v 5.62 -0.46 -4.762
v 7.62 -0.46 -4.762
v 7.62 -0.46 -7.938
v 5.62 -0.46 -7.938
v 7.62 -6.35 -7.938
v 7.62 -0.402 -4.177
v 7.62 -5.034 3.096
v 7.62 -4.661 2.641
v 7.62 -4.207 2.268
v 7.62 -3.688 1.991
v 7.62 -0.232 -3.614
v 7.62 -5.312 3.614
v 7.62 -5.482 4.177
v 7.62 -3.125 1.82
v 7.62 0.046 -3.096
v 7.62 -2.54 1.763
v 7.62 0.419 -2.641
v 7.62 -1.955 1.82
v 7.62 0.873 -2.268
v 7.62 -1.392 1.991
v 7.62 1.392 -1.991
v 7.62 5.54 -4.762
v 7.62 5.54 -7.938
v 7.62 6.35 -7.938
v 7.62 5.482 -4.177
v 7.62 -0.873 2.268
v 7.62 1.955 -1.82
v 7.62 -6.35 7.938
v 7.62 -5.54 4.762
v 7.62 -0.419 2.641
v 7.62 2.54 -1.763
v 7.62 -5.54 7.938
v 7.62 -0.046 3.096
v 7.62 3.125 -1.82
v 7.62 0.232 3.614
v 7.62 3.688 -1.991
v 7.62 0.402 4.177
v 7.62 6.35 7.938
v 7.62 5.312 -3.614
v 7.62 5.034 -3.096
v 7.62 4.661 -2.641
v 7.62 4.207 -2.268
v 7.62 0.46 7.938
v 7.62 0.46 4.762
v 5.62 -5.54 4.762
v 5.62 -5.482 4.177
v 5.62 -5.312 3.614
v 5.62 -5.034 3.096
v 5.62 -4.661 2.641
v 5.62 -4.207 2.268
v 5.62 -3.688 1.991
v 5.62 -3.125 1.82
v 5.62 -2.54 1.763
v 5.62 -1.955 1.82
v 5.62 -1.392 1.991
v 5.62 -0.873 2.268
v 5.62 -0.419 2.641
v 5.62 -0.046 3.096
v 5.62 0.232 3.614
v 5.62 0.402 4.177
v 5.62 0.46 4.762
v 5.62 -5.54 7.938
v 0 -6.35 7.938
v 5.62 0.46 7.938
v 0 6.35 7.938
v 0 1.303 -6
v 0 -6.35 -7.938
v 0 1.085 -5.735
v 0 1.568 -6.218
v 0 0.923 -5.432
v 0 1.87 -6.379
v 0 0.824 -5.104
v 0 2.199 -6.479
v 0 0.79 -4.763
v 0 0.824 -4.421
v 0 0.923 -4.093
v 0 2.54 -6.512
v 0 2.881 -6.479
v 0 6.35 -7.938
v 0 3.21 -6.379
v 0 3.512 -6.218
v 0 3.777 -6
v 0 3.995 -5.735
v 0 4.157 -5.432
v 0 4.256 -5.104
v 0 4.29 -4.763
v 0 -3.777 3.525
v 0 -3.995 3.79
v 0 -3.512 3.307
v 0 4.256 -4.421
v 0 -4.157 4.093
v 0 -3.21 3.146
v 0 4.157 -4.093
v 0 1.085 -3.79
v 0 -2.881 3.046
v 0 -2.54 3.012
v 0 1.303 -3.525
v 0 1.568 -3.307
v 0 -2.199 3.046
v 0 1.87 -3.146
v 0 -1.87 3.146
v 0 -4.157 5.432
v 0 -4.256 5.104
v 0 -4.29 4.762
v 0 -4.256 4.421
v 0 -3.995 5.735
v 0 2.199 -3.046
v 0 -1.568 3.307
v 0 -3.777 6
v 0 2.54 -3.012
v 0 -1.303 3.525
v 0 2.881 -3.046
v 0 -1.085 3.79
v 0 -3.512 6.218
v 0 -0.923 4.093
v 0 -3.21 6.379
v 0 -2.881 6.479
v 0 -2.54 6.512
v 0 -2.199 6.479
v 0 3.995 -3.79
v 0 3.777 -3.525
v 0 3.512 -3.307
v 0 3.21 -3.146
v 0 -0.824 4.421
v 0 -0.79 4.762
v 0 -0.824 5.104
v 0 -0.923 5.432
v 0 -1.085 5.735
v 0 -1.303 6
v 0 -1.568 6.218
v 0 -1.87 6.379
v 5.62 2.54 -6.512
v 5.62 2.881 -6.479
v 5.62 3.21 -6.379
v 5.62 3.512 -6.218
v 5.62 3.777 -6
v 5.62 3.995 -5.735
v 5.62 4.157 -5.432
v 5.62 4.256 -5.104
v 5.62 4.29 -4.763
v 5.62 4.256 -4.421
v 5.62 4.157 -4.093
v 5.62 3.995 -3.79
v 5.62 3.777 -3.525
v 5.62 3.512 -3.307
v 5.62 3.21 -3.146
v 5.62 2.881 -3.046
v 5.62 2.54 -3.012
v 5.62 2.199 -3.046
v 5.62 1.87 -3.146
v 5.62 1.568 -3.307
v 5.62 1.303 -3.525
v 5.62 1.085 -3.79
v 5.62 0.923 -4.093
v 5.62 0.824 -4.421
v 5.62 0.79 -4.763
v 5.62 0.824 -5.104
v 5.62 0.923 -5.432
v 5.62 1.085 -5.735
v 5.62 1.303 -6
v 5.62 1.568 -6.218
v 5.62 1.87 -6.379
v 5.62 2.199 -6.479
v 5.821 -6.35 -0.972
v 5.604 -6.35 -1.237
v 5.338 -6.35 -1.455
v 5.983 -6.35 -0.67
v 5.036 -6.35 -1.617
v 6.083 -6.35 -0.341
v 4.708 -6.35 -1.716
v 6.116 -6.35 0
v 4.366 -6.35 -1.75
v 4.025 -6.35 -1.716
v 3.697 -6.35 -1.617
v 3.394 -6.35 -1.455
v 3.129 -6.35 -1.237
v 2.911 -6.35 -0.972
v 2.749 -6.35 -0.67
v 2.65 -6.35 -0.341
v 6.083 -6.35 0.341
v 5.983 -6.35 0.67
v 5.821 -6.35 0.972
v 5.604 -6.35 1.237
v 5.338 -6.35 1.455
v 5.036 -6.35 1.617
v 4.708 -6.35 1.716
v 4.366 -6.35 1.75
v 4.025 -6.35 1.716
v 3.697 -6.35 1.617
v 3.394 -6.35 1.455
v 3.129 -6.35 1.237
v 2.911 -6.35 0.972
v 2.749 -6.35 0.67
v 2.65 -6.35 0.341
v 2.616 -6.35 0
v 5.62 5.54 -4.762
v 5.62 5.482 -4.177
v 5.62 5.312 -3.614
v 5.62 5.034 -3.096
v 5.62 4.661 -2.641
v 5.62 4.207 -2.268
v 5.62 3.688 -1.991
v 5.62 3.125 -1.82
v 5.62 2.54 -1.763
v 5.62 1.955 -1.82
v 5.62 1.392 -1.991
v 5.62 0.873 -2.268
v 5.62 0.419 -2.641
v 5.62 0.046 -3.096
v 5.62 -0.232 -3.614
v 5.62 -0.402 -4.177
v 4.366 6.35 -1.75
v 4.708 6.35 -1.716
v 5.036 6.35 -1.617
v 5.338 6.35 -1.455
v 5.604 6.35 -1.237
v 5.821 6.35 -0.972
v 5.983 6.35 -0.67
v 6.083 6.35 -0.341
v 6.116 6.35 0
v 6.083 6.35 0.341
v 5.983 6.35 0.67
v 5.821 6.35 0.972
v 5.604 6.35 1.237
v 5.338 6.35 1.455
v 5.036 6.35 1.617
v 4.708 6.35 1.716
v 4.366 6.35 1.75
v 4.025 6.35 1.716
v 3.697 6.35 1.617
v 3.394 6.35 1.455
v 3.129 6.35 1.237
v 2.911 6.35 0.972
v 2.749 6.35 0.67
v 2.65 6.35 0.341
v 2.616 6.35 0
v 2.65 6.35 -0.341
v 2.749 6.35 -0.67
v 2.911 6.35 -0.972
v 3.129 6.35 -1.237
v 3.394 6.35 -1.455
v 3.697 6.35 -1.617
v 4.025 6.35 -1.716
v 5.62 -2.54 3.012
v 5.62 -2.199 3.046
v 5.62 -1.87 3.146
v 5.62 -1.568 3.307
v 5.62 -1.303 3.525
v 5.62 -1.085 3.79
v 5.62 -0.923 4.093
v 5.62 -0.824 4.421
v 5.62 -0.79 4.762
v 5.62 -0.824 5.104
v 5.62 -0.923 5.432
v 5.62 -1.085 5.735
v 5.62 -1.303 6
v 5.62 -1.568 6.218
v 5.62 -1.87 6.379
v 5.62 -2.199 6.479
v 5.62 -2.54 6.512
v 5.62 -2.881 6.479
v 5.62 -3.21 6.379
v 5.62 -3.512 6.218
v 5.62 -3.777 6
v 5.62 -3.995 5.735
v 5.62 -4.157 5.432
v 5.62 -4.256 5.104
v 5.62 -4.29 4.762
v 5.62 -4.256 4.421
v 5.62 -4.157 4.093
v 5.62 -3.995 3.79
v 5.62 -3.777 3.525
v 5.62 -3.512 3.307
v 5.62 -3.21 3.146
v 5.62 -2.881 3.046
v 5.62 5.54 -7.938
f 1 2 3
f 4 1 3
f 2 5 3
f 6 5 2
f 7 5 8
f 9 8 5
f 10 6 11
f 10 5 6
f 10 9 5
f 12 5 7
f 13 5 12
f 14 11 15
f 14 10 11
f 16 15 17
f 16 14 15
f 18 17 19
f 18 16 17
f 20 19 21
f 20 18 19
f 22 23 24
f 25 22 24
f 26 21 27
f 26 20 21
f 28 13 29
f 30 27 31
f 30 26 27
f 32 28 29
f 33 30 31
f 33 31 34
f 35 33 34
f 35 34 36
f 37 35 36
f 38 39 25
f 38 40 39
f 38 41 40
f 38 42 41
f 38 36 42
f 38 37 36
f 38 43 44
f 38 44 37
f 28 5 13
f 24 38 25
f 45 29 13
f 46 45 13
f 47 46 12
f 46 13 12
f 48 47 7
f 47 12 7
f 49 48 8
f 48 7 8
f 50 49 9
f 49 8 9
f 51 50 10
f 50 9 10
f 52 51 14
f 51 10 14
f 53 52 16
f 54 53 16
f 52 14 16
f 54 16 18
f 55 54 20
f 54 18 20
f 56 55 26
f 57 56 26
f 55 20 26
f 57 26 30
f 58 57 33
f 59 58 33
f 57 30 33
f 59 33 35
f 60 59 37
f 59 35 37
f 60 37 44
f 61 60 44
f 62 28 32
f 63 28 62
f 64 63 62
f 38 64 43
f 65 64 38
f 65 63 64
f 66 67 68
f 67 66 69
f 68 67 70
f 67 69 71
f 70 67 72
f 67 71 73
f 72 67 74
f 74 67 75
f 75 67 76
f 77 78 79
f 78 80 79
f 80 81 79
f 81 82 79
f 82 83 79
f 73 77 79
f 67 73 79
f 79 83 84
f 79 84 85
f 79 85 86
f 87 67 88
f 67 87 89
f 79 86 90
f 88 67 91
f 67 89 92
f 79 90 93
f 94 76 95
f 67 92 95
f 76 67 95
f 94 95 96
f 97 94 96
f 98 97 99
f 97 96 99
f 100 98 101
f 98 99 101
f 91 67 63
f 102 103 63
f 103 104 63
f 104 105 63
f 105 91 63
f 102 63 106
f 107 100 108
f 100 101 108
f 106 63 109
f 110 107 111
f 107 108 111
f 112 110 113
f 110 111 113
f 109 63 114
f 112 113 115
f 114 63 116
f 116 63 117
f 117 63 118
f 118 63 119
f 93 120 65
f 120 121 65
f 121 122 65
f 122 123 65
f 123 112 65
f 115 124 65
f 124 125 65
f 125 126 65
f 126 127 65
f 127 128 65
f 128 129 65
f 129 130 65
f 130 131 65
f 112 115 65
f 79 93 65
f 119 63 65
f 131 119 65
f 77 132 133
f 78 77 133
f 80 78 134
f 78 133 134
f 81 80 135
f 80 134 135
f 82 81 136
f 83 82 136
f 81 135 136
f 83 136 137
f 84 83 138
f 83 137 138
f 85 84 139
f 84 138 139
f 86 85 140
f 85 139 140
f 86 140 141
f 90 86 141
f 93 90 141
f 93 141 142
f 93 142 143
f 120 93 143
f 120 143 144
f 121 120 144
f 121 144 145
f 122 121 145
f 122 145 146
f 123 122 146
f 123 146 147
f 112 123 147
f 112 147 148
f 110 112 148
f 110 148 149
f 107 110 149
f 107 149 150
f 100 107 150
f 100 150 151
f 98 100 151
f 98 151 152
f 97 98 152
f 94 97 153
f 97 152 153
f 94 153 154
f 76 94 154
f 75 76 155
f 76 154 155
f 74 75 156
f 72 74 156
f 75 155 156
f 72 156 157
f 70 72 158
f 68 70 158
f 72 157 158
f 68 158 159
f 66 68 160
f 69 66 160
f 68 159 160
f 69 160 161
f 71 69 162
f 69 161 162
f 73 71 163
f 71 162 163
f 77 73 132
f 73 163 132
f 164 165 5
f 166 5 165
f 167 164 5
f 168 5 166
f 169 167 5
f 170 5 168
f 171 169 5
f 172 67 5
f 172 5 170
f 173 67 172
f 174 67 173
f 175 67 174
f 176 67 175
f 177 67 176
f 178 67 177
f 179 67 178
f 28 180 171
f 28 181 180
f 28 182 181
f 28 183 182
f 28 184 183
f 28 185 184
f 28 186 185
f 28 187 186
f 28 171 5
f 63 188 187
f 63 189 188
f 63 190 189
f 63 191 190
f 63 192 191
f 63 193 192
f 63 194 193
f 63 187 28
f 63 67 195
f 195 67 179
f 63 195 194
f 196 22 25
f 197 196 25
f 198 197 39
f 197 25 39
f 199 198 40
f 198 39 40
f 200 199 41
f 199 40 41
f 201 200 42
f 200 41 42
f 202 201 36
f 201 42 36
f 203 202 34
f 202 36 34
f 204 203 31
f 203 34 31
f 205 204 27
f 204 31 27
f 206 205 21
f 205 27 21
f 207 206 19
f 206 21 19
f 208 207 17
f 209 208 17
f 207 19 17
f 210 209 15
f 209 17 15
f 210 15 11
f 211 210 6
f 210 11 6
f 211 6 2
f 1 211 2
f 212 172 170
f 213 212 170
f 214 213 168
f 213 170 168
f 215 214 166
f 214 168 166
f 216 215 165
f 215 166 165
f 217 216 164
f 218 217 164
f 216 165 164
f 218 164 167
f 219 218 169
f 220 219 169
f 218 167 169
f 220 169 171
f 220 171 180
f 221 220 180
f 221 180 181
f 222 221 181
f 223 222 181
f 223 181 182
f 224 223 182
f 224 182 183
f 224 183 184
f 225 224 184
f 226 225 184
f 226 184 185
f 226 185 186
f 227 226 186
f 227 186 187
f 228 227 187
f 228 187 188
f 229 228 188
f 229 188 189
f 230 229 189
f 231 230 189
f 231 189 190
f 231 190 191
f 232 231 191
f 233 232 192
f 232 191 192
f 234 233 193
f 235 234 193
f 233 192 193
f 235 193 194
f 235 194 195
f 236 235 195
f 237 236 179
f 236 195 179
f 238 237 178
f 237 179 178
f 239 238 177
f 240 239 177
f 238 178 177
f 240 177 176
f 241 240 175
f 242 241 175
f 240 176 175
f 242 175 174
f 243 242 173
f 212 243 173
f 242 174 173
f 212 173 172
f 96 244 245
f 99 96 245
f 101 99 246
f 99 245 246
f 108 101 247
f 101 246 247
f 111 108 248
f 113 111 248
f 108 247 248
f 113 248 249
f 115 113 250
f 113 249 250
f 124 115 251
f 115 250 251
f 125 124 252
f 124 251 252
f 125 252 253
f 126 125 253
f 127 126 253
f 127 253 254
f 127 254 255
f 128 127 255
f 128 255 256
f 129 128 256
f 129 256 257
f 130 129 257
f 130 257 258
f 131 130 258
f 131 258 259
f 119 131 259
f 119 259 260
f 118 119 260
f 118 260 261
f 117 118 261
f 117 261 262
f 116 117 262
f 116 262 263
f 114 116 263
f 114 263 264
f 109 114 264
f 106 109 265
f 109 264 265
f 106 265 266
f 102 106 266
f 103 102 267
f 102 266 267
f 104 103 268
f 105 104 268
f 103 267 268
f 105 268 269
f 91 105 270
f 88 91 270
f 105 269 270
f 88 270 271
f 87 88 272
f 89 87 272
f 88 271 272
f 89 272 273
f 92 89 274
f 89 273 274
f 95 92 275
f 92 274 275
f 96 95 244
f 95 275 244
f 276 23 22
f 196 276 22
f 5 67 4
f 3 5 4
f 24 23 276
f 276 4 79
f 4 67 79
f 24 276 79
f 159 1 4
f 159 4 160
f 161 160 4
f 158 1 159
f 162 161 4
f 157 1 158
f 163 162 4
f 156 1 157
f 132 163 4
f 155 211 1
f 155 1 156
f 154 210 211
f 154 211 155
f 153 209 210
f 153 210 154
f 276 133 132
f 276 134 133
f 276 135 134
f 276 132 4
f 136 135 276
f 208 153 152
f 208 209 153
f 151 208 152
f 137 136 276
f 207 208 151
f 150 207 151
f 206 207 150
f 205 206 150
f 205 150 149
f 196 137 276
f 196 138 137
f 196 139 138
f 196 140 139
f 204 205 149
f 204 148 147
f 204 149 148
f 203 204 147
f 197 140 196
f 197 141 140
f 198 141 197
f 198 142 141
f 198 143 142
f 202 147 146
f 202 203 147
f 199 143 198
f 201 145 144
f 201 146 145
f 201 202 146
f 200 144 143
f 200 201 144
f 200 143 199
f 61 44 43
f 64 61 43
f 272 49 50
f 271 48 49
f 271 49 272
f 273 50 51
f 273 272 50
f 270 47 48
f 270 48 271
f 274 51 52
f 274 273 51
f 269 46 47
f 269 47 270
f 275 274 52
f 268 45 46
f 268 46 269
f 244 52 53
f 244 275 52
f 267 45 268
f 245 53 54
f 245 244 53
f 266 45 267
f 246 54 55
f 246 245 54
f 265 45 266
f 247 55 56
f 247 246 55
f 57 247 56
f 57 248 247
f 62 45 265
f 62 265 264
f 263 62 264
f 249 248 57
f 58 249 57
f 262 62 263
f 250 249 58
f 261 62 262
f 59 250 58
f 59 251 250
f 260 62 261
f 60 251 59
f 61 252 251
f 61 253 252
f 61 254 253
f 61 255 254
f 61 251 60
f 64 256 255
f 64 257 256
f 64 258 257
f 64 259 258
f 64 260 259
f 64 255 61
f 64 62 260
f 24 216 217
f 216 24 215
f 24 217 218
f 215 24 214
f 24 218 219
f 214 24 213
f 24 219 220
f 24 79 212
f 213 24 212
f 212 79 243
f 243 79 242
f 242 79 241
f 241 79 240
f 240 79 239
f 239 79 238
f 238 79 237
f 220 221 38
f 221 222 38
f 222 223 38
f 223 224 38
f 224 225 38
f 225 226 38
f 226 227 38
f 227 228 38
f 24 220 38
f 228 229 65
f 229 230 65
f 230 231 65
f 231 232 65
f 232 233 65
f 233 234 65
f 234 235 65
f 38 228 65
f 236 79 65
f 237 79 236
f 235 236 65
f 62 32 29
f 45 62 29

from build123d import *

# Parameters (mm, degrees)
SKETCH1_W           = 12.7
SKETCH1_H           = 15.875
BOSS_EXTRUDE1_DEPTH = 7.62
SKETCH3_R           = 1.75
CUT_EXTRUDE1_DEPTH  = 22.2885
SKETCH4_R           = 1.75
CUT_EXTRUDE2_DEPTH  = 22.2885
SKETCH5_R           = 1.75
CUT_EXTRUDE3_DEPTH  = 2


with BuildPart() as part:
    # Sketch1 → Boss-Extrude1 (new body)
    with BuildSketch(Plane.YZ):
        Rectangle(SKETCH1_W, SKETCH1_H)
    extrude(amount=BOSS_EXTRUDE1_DEPTH)

    # Sketch3 → Cut-Extrude1 (cut)
    with BuildSketch(Plane.XZ.offset(6.35)):
        with Locations((4.36625, 0)):
            Circle(SKETCH3_R)
    extrude(amount=-CUT_EXTRUDE1_DEPTH, mode=Mode.SUBTRACT)

    # Sketch4 → Cut-Extrude2 (cut)
    with BuildSketch(Plane.YZ.offset(7.62)):
        with Locations((-2.54, 4.7625)):
            Circle(SKETCH4_R)
        with Locations((2.54, -4.7625)):
            Circle(SKETCH4_R)
    extrude(amount=-CUT_EXTRUDE2_DEPTH, mode=Mode.SUBTRACT)

    # Sketch5 → Cut-Extrude3 (cut)
    # profile 1 of 2: a face of its own
    with BuildSketch(Plane.YZ.offset(7.62)):
        with BuildLine():
            Line((-5.54, 7.9375), (-5.54, 4.7625))
            ThreePointArc((-5.54, 4.7625), (-2.54, 1.7625), (0.46, 4.7625))
            Line((0.46, 4.7625), (0.46, 7.9375))
            Line((0.46, 7.9375), (-5.54, 7.9375))
        make_face()
        with Locations((-2.54, 4.7625)):
            Circle(SKETCH5_R, mode=Mode.SUBTRACT)
    # profile 2 of 2: a face of its own
    with BuildSketch(Plane.YZ.offset(7.62)):
        with BuildLine():
            ThreePointArc((5.54, -4.7625), (2.54, -1.7625), (-0.46, -4.7625))
            Line((-0.46, -4.7625), (-0.46, -7.9375))
            Line((-0.46, -7.9375), (5.54, -7.9375))
            Line((5.54, -7.9375), (5.54, -4.7625))
        make_face()
        with Locations((2.54, -4.7625)):
            Circle(SKETCH5_R, mode=Mode.SUBTRACT)
    extrude(amount=-CUT_EXTRUDE3_DEPTH, mode=Mode.SUBTRACT)


solid = part.part
